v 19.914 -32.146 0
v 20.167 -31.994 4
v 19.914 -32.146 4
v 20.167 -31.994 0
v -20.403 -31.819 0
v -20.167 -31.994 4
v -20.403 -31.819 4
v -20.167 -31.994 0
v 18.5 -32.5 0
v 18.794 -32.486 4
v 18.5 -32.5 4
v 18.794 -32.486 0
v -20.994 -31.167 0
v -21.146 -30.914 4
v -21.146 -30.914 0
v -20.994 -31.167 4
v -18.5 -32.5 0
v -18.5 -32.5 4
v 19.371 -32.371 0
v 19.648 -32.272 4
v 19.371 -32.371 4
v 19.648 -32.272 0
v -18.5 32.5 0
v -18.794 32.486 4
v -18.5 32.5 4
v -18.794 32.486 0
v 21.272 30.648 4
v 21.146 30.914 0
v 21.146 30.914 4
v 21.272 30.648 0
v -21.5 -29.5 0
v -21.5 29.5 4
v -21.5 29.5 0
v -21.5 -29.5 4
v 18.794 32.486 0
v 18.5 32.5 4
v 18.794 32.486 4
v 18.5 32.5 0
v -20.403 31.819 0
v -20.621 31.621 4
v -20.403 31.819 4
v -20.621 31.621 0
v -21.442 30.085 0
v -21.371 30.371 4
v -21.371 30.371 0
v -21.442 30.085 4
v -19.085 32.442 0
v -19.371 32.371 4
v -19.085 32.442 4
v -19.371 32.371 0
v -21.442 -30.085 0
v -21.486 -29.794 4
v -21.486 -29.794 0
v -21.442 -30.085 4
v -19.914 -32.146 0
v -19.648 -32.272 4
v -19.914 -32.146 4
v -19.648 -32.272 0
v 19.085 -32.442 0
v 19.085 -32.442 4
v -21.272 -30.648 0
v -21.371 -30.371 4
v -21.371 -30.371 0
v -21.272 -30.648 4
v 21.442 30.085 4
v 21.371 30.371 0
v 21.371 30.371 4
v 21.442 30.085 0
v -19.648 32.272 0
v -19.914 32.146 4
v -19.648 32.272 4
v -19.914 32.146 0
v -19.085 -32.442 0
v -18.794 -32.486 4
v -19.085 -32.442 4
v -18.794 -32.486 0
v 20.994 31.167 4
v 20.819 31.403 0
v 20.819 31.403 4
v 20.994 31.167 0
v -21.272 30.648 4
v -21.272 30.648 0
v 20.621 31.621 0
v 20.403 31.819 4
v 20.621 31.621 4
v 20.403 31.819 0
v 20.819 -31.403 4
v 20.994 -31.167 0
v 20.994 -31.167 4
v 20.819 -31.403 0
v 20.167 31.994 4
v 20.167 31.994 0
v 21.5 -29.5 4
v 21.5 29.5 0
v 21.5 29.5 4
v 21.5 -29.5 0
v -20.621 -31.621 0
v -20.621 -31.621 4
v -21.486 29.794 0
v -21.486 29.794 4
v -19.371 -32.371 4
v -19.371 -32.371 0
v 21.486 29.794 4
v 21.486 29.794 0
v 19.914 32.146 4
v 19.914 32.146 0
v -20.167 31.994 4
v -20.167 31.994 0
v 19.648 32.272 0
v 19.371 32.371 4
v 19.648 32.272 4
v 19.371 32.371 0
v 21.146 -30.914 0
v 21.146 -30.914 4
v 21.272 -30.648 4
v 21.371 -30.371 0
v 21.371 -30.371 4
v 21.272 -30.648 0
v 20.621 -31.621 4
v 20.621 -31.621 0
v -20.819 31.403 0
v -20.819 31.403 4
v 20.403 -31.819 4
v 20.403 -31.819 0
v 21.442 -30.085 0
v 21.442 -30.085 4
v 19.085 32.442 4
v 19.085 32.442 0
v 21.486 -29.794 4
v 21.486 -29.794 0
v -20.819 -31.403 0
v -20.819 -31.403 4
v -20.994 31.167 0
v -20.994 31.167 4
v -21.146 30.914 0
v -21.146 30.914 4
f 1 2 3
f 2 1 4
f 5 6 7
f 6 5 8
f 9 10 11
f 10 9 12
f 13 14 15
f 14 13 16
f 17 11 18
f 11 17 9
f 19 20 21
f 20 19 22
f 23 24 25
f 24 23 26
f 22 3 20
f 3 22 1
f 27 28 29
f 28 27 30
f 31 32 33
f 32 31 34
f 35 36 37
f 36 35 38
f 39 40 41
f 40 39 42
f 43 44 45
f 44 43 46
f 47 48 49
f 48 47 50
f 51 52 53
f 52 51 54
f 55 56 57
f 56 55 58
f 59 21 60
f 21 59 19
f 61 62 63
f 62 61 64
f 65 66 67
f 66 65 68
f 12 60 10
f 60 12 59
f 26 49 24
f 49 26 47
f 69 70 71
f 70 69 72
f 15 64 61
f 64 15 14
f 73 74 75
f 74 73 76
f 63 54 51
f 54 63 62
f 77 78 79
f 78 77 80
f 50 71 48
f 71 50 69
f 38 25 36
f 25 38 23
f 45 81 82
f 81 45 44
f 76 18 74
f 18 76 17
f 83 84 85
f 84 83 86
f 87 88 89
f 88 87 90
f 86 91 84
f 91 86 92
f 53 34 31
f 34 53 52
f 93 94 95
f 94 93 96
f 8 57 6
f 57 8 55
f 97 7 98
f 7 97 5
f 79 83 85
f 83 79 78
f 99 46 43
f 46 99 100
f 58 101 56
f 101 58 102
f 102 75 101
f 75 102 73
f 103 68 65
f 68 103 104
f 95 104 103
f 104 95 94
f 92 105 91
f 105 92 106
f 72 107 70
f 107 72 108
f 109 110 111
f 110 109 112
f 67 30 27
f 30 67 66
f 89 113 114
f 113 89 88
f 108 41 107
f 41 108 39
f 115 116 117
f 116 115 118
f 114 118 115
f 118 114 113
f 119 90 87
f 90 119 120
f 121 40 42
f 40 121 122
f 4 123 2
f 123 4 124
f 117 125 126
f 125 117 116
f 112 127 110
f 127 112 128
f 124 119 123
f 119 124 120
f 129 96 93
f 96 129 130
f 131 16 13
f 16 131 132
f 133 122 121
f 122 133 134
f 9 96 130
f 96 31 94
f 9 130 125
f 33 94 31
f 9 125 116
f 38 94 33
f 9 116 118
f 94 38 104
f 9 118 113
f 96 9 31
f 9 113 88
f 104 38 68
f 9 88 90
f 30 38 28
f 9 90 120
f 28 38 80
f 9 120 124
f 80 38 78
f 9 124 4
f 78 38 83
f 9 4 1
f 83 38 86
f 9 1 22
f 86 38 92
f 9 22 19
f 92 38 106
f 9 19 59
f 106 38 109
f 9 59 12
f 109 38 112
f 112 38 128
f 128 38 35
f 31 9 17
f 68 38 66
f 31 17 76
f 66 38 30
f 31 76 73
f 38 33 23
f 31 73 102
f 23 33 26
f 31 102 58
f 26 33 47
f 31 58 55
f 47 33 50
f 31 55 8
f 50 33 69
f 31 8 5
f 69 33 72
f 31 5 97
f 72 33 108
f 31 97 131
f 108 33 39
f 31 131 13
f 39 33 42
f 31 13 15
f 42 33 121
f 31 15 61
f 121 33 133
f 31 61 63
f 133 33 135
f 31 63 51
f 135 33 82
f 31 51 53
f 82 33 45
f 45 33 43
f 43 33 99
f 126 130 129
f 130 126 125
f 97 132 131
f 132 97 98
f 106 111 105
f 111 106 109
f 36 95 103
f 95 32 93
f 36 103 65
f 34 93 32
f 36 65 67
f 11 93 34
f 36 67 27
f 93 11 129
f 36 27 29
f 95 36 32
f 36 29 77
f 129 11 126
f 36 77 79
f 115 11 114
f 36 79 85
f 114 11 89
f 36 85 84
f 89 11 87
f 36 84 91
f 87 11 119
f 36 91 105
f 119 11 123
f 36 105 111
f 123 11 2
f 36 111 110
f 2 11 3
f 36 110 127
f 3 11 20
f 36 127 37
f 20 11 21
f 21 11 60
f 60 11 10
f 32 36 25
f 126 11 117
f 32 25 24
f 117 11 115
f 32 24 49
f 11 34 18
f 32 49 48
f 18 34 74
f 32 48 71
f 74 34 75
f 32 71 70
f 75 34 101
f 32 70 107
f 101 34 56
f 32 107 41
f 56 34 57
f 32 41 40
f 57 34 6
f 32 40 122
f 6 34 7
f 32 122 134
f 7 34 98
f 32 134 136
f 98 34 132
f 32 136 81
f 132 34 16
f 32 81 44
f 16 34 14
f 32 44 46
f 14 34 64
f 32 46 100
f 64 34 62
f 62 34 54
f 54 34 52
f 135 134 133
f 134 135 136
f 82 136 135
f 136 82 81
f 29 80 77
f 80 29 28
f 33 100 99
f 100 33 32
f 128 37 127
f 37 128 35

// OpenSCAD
// Draw/Discard deck marker card — 43 x 65 mm, printed flat on the bed.
// "DISCARD" inlaid on top, "DRAW" (mirrored) inlaid on the bottom, both
// at the same font size and center. Letters are a separate body for
// multi-color printing; pockets in the card are the exact same solids
// (zero clearance — multi-material bodies must touch).
//
// The bottom word is mirrored across X so it reads correctly after
// flipping the card side-over-side (about its long axis).
//
// font_size is calibrated so DISCARD spans card width minus margins;
// verified against the exported mesh (see comment at font_size).

part = "all";   // "card" | "letters" | "all"

$fn = 64;

card_w   = 43;    // X — the words read across this axis
card_l   = 65;    // Y
card_t   = 4;     // 5 works too; 4 saves ~8 layers at a 0.2 nozzle
corner_r = 3;
margin   = 3;     // side margin for the text on each side
inlay    = 0.6;   // letter depth, flush with each face

font      = "Liberation Sans:style=Bold";
font_size = 6.11; // calibrated: DISCARD measures 36.97mm wide (target 37)

word_top = "DISCARD";
word_bot = "DRAW";

eps = 0.01;

module card_blank() {
    linear_extrude(height = card_t)
        offset(r = corner_r)
            square([card_w - 2*corner_r, card_l - 2*corner_r], center = true);
}

module word_2d(w) {
    text(w, size = font_size, font = font,
         halign = "center", valign = "center");
}

// Letters, positioned in their inlay pockets.
module letters() {
    // Top face: DISCARD, flush at Z = card_t.
    translate([0, 0, card_t - inlay])
        linear_extrude(height = inlay) word_2d(word_top);
    // Bottom face: DRAW, mirrored, flush at Z = 0.
    mirror([1, 0, 0])
        linear_extrude(height = inlay) word_2d(word_bot);
}

// Pockets: identical letter shapes, extended past the faces for a clean cut.
module pockets() {
    translate([0, 0, card_t - inlay])
        linear_extrude(height = inlay + 1) word_2d(word_top);
    mirror([1, 0, 0])
        translate([0, 0, -1])
            linear_extrude(height = inlay + 1) word_2d(word_bot);
}

module card() {
    difference() {
        card_blank();
        pockets();
    }
}

// color() renders in preview mode only (the render script's default);
// full --render and STL export ignore it. Purely cosmetic.
if (part == "card" || part == "all") color("DimGray") card();
if (part == "letters" || part == "all") color("Gold") letters();
